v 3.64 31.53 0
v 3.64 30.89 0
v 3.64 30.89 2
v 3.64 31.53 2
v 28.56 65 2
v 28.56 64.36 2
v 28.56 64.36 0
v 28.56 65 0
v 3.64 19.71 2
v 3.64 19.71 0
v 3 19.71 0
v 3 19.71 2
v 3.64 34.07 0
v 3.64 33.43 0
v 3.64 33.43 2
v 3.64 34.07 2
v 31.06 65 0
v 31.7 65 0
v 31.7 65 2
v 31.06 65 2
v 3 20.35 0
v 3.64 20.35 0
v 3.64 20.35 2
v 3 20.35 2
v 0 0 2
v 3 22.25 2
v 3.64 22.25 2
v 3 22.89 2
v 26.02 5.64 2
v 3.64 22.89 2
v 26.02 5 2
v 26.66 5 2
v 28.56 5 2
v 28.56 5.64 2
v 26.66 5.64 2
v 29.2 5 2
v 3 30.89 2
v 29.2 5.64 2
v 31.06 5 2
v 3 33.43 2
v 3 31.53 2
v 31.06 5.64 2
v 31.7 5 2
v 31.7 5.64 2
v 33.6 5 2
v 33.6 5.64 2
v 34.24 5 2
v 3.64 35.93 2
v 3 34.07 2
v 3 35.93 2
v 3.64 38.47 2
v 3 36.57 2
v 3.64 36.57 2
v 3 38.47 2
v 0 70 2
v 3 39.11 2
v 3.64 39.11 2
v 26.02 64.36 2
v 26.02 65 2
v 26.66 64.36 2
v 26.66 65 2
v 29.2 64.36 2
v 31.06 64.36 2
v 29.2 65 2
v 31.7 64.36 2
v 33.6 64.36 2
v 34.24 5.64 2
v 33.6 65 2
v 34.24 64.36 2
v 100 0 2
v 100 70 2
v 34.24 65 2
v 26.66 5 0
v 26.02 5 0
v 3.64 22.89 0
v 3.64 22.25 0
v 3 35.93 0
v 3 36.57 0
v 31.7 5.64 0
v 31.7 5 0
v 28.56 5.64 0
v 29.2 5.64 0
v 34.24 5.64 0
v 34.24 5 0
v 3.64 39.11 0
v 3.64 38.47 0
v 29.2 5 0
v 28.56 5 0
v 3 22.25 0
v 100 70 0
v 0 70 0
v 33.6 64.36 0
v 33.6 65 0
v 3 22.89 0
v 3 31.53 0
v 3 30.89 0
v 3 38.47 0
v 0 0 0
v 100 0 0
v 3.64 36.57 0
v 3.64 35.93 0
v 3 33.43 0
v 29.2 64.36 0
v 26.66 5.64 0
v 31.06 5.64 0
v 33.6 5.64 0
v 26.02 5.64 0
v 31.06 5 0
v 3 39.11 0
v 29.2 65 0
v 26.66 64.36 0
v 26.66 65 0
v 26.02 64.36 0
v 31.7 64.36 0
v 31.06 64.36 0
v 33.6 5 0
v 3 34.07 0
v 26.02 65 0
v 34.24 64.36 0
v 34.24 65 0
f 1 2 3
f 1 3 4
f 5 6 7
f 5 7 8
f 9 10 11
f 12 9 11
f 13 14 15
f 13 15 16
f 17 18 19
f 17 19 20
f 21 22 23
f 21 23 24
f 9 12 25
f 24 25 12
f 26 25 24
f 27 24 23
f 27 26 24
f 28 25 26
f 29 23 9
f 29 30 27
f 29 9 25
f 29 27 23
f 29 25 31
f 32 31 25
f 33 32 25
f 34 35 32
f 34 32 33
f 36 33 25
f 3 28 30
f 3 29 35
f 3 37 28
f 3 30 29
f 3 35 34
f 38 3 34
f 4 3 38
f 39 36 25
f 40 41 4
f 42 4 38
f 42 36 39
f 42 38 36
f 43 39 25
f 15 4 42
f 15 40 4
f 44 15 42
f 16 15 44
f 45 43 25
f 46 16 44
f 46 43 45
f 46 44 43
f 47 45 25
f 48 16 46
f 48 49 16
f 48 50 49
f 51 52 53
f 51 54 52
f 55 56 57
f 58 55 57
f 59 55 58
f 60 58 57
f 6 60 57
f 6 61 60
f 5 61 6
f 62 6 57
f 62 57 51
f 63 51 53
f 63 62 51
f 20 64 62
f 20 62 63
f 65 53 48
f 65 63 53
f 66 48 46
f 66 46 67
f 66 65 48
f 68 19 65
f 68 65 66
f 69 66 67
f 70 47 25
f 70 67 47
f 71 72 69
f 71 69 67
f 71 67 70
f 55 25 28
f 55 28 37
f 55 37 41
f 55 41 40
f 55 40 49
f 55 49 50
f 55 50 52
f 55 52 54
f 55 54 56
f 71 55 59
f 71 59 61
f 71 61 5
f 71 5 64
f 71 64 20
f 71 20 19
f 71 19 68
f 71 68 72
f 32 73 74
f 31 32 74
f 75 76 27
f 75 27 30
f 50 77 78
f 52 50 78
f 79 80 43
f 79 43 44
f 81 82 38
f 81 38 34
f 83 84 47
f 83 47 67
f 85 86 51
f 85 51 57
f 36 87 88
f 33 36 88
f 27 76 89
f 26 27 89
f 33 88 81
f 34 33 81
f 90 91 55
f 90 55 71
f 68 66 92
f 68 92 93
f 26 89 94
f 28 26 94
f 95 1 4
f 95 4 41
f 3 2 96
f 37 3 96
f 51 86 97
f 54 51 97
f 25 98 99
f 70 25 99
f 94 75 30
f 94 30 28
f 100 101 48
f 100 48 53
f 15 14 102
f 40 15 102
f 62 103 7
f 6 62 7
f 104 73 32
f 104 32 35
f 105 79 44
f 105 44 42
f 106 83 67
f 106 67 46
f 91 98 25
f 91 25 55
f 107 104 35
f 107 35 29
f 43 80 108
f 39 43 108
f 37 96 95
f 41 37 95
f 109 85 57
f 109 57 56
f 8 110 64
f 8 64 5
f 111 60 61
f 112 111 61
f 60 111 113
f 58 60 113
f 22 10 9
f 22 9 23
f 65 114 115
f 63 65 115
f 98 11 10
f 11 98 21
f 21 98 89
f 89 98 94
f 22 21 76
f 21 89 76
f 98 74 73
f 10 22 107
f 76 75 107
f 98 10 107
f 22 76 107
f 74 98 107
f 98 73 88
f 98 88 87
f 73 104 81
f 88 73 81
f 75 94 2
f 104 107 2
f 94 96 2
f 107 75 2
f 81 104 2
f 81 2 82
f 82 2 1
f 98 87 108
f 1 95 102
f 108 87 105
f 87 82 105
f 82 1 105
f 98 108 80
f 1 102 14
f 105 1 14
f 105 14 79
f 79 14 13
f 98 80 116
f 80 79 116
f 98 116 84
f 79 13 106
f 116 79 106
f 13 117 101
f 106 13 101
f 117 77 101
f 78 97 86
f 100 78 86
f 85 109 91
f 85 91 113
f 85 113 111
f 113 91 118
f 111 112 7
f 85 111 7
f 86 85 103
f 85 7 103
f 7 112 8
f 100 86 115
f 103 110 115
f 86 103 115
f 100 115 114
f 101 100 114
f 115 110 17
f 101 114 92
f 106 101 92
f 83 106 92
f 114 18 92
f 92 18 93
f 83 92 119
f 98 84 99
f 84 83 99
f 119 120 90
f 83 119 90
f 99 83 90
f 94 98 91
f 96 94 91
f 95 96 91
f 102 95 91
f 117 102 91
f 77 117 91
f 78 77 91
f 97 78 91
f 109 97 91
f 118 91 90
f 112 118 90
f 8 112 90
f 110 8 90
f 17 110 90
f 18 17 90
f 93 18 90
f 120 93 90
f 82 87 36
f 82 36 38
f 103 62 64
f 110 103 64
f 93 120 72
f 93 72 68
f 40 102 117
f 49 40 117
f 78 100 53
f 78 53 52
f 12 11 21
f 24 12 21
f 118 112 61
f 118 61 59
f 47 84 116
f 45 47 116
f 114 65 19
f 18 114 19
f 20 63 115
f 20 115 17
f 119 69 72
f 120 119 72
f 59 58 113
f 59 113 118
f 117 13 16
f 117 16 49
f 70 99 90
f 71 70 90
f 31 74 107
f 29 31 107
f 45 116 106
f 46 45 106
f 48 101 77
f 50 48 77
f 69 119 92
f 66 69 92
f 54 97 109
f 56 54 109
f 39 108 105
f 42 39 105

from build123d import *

# Parameters (mm, degrees)
CROQUIS1_W              = 130
CROQUIS1_H              = 70
SALIENTE_EXTRUIR1_DEPTH = 2
CROQUIS2_W              = 30
CROQUIS2_H              = 70
CORTAR_EXTRUIR1_DEPTH   = 148.66177569
CROQUIS3_W              = 0.64
CROQUIS3_H              = 0.64
CORTAR_EXTRUIR2_DEPTH   = 123.081939696


with BuildPart() as part:
    # Croquis1 → Saliente-Extruir1 (new body)
    with BuildSketch(Plane.XY):
        with Locations((65, 35)):
            Rectangle(CROQUIS1_W, CROQUIS1_H)
    extrude(amount=SALIENTE_EXTRUIR1_DEPTH)

    # Croquis2 → Cortar-Extruir1 (cut, through all)
    with BuildSketch(Plane(origin=(0, 0, 0), x_dir=(-1, 0, 0), z_dir=(0, 0, -1))):
        with Locations((-115, 35)):
            Rectangle(CROQUIS2_W, CROQUIS2_H)
    extrude(amount=-CORTAR_EXTRUIR1_DEPTH, mode=Mode.SUBTRACT)

    # Croquis3 → Cortar-Extruir2 (cut, through all)
    with BuildSketch(Plane(origin=(0, 0, 0), x_dir=(-1, 0, 0), z_dir=(0, 0, -1))):
        with Locations((-3.32, 36.25)):
            Rectangle(CROQUIS3_W, CROQUIS3_H)
        with Locations((-3.32, 31.21)):
            Rectangle(CROQUIS3_W, CROQUIS3_H)
        with Locations((-3.32, 38.79)):
            Rectangle(CROQUIS3_W, CROQUIS3_H)
        with Locations((-3.32, 33.75)):
            Rectangle(CROQUIS3_W, CROQUIS3_H)
        with Locations((-28.88, 5.32)):
            Rectangle(CROQUIS3_W, CROQUIS3_H)
        with Locations((-33.92, 5.32)):
            Rectangle(CROQUIS3_W, CROQUIS3_H)
        with Locations((-26.34, 5.32)):
            Rectangle(CROQUIS3_W, CROQUIS3_H)
        with Locations((-31.38, 5.32)):
            Rectangle(CROQUIS3_W, CROQUIS3_H)
        with Locations((-33.92, 64.68)):
            Rectangle(CROQUIS3_W, CROQUIS3_H)
        with Locations((-31.38, 64.68)):
            Rectangle(CROQUIS3_W, CROQUIS3_H)
        with Locations((-26.34, 64.68)):
            Rectangle(CROQUIS3_W, CROQUIS3_H)
        with Locations((-28.88, 64.68)):
            Rectangle(CROQUIS3_W, CROQUIS3_H)
        with Locations((-3.32, 20.03)):
            Rectangle(CROQUIS3_W, CROQUIS3_H)
        with Locations((-3.32, 22.57)):
            Rectangle(CROQUIS3_W, CROQUIS3_H)
    extrude(amount=-CORTAR_EXTRUIR2_DEPTH, mode=Mode.SUBTRACT)


solid = part.part
